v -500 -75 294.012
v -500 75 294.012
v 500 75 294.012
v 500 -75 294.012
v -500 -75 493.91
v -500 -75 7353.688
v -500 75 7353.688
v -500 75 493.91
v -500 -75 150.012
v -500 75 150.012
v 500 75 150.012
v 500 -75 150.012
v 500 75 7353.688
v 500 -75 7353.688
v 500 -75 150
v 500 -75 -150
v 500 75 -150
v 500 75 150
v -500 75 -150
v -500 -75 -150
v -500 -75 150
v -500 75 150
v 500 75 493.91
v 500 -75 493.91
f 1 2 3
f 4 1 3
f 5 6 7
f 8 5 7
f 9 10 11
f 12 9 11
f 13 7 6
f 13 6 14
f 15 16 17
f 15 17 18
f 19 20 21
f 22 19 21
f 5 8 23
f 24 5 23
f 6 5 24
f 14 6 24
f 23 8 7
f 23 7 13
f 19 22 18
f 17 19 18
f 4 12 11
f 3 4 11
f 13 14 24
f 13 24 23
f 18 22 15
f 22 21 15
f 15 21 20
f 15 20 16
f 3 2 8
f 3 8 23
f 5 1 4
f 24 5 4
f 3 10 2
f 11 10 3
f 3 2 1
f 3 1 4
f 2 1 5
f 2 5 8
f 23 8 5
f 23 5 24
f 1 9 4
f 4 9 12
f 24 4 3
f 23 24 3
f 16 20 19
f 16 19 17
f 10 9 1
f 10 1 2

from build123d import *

# Parameters (mm, degrees)
F0_W     = 1000.00054
F0_H     = 299.9994
F1_DEPTH = 74.999977
F3_W     = 1000.00054
F3_H     = 149.999954
F4_DEPTH = 143.999966
F5_W     = 1000.00054
F5_H     = 149.999954
F6_DEPTH = 199.898
F7_W     = 1000.00054
F7_H     = 149.999954
F8_DEPTH = 6859.778


with BuildPart() as f1:
    # F0 (on Front) → F1 (new body, symmetric)
    with BuildSketch(Plane.XZ):
        Rectangle(F0_W, F0_H)
    extrude(amount=F1_DEPTH, both=True)


with BuildPart() as f4:
    # F3 (on offset) → F4 (new body)
    with BuildSketch(Plane.XY.offset(150.0124)):
        Rectangle(F3_W, F3_H)
    extrude(amount=F4_DEPTH)


with BuildPart() as f6:
    # F5 (on face) → F6 (new body)
    with BuildSketch(Plane.XY.offset(294.012366)):
        Rectangle(F5_W, F5_H)
    extrude(amount=F6_DEPTH)


with BuildPart() as f8:
    # F7 (on face) → F8 (new body)
    with BuildSketch(Plane.XY.offset(493.910366)):
        Rectangle(F7_W, F7_H)
    extrude(amount=F8_DEPTH)


solid = Compound([f1.part, f4.part, f6.part, f8.part])
